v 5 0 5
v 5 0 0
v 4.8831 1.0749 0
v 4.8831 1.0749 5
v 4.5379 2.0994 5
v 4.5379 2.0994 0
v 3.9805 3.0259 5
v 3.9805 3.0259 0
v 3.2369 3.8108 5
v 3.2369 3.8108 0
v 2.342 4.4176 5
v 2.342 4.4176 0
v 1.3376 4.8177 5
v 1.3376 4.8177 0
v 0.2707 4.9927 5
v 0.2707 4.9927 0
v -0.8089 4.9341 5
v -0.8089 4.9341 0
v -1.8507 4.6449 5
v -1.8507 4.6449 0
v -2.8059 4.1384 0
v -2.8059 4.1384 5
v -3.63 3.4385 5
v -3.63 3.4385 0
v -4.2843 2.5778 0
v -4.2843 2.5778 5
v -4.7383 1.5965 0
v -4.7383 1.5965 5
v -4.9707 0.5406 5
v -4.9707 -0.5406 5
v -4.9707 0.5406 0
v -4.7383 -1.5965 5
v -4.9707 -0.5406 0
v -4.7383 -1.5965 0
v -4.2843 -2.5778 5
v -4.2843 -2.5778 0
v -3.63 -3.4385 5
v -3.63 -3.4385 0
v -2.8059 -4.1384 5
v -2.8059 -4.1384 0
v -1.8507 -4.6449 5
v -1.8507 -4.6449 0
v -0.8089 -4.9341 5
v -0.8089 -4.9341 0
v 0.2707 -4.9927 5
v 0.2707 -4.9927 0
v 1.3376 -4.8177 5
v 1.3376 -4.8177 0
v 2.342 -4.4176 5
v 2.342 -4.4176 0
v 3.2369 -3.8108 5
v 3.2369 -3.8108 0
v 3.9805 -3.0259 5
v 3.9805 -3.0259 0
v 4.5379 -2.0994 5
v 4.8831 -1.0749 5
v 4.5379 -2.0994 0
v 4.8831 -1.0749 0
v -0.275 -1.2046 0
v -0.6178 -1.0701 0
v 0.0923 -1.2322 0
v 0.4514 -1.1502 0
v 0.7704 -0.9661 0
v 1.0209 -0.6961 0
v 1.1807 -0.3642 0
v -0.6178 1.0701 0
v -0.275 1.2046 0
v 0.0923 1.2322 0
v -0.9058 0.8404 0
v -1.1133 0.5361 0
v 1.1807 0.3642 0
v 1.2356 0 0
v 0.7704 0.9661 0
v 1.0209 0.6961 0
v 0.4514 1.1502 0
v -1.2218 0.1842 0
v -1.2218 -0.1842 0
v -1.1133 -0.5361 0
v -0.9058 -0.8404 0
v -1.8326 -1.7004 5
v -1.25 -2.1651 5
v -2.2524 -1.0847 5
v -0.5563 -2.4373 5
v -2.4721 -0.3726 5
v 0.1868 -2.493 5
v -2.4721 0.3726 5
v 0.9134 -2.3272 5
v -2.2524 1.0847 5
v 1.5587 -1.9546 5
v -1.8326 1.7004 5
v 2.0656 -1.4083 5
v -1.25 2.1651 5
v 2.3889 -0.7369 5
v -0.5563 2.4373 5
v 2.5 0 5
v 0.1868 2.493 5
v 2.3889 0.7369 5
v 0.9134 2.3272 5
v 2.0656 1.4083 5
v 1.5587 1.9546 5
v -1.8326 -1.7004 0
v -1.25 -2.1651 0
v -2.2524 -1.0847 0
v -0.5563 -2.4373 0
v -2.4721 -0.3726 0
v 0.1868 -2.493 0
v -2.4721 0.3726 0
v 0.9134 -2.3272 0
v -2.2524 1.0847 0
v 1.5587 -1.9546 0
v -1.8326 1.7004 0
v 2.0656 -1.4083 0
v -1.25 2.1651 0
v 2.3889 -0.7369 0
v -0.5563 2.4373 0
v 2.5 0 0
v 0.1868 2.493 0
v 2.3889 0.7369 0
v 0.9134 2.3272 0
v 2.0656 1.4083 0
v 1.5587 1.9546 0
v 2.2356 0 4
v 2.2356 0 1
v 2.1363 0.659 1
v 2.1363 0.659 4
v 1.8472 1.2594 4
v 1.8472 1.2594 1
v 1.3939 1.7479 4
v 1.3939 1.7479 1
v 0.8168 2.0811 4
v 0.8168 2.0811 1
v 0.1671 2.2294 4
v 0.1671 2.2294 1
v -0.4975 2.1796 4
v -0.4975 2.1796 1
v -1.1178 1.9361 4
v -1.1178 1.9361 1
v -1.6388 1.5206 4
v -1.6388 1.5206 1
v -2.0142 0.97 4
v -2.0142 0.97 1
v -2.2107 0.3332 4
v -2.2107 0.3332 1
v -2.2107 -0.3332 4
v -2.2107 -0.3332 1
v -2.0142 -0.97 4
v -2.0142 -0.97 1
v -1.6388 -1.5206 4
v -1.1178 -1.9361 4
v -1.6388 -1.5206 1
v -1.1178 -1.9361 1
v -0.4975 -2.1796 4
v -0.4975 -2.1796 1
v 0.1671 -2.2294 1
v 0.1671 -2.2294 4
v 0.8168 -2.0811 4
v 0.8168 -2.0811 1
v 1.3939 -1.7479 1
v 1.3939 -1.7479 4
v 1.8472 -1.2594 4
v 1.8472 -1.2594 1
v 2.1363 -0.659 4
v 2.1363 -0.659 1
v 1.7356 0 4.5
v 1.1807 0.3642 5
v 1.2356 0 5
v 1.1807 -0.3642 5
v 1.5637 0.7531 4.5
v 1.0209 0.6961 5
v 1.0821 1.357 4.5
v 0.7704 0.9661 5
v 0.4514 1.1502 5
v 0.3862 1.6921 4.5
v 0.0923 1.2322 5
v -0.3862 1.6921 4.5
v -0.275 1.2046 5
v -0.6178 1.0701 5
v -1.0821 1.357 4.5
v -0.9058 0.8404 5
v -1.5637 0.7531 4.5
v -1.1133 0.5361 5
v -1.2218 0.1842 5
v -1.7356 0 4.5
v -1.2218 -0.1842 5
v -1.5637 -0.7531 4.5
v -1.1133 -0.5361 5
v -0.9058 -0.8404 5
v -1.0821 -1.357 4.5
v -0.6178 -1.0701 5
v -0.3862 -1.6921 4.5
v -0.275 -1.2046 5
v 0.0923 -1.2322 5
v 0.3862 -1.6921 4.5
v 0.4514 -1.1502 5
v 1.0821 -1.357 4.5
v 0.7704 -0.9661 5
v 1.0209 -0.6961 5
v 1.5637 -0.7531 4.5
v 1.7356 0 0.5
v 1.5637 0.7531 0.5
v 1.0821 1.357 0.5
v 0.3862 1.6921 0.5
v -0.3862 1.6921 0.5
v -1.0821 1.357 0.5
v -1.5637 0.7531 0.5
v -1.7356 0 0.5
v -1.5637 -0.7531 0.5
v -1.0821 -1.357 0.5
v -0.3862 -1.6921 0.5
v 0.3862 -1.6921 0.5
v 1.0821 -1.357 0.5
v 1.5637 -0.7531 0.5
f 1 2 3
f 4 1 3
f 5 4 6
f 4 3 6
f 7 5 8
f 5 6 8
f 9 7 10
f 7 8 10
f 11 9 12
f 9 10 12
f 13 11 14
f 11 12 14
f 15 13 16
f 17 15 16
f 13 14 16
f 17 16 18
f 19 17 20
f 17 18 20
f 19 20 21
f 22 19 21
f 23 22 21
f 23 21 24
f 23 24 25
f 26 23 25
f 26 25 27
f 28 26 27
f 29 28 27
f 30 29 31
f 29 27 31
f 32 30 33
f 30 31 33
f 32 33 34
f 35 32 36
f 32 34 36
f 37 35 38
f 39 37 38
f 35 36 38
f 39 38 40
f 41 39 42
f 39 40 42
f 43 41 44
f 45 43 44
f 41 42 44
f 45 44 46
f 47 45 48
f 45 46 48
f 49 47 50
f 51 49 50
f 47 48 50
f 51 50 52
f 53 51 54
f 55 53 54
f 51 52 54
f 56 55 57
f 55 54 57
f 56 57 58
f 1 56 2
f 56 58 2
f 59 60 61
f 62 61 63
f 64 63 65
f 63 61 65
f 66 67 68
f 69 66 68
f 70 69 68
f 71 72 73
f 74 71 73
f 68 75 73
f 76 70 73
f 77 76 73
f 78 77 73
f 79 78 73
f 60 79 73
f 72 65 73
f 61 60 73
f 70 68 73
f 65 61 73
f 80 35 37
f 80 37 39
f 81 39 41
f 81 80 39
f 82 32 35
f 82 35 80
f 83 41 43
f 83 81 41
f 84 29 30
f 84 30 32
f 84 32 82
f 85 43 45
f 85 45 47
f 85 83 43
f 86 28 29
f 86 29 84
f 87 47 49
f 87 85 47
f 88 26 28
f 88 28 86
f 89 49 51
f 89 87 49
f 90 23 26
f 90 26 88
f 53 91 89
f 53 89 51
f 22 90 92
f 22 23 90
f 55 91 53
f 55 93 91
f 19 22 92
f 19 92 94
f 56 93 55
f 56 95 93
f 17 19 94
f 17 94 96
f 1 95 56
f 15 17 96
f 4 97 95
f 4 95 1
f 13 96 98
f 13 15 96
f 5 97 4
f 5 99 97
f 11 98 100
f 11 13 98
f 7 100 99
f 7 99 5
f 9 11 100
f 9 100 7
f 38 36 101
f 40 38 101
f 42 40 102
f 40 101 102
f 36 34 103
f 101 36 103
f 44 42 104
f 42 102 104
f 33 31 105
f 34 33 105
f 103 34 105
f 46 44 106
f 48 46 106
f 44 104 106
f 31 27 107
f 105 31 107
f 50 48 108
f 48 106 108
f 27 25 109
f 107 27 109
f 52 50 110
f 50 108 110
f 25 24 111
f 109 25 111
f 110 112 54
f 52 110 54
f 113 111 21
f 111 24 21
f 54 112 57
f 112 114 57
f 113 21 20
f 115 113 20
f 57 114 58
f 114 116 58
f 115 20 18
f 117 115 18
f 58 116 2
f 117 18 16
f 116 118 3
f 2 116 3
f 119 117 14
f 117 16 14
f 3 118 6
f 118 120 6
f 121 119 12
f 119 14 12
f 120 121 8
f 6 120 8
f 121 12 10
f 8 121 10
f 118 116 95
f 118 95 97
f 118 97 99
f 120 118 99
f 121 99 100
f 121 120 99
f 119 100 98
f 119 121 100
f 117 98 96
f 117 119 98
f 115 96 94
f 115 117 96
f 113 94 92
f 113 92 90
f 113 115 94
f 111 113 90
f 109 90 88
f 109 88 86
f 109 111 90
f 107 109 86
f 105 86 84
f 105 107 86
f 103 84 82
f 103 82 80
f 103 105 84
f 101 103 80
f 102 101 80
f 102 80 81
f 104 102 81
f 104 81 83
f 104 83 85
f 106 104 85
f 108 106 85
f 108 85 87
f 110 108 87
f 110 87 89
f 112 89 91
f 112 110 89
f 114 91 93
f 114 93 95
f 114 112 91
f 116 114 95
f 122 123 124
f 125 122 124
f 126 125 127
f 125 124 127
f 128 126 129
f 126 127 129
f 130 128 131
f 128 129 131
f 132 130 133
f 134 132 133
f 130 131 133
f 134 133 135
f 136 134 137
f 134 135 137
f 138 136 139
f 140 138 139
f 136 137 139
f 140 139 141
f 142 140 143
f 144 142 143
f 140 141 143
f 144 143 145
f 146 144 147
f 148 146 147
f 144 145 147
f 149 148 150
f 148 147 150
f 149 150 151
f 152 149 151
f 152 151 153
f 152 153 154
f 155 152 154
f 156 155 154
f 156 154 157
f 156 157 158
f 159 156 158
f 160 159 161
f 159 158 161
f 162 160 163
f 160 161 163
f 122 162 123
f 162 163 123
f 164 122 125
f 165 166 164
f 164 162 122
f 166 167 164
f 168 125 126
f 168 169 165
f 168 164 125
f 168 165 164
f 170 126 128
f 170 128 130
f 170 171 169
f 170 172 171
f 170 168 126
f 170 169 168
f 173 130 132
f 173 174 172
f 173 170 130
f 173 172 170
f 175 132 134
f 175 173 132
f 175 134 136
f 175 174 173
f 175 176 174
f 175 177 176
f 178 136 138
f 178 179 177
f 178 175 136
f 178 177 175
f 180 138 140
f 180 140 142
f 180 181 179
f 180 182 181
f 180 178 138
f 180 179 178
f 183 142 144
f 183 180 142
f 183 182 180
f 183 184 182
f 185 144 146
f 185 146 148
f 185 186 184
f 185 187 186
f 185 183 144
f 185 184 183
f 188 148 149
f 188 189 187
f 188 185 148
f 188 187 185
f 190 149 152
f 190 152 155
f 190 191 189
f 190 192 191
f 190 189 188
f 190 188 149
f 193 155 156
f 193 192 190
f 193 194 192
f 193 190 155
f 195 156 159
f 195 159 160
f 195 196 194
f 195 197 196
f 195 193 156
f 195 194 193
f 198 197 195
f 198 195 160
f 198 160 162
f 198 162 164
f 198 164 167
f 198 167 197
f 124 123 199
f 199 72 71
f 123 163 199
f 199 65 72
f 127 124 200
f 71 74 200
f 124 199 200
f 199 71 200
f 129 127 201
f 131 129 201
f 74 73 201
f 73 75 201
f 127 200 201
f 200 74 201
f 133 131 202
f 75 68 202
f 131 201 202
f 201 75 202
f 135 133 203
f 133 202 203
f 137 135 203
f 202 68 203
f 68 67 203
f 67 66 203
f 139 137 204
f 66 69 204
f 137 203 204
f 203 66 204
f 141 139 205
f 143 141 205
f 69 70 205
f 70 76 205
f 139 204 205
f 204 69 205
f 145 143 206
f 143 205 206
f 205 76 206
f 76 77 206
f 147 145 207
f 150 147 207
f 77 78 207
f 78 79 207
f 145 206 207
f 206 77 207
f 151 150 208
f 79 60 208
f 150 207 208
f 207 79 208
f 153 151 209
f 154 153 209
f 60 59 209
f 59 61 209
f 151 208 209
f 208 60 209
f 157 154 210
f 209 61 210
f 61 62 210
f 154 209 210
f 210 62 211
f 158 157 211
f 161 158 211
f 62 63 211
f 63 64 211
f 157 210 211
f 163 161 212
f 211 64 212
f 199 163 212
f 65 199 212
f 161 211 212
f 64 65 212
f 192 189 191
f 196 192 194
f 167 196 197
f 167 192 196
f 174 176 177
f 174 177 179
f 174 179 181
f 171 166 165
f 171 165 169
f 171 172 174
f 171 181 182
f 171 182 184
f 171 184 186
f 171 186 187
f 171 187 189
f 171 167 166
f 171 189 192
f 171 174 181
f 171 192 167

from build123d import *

# Parameters (mm, degrees)
F0_R     = 5
F0_R_2   = 2.5
F1_DEPTH = 5
F2_R     = 2.235628
F3_DEPTH = 5
F4_SIZE  = 1


with BuildPart() as f1:
    # F0 (on Top) → F1 (new body)
    with BuildSketch(Plane.XY):
        Circle(F0_R)
        Circle(F0_R_2, mode=Mode.SUBTRACT)
    extrude(amount=F1_DEPTH)


with BuildPart() as f3:
    # F2 (on Top) → F3 (new body)
    with BuildSketch(Plane.XY):
        Circle(F2_R)
    extrude(amount=F3_DEPTH)

    # F4
    f4_edges = [f3.edges().sort_by_distance(p)[0] for p in [
        (-2.235628, 0, 0),
        (-2.235628, 0, 5),
    ]]
    chamfer(f4_edges, length=F4_SIZE)


solid = Compound([f1.part, f3.part])
